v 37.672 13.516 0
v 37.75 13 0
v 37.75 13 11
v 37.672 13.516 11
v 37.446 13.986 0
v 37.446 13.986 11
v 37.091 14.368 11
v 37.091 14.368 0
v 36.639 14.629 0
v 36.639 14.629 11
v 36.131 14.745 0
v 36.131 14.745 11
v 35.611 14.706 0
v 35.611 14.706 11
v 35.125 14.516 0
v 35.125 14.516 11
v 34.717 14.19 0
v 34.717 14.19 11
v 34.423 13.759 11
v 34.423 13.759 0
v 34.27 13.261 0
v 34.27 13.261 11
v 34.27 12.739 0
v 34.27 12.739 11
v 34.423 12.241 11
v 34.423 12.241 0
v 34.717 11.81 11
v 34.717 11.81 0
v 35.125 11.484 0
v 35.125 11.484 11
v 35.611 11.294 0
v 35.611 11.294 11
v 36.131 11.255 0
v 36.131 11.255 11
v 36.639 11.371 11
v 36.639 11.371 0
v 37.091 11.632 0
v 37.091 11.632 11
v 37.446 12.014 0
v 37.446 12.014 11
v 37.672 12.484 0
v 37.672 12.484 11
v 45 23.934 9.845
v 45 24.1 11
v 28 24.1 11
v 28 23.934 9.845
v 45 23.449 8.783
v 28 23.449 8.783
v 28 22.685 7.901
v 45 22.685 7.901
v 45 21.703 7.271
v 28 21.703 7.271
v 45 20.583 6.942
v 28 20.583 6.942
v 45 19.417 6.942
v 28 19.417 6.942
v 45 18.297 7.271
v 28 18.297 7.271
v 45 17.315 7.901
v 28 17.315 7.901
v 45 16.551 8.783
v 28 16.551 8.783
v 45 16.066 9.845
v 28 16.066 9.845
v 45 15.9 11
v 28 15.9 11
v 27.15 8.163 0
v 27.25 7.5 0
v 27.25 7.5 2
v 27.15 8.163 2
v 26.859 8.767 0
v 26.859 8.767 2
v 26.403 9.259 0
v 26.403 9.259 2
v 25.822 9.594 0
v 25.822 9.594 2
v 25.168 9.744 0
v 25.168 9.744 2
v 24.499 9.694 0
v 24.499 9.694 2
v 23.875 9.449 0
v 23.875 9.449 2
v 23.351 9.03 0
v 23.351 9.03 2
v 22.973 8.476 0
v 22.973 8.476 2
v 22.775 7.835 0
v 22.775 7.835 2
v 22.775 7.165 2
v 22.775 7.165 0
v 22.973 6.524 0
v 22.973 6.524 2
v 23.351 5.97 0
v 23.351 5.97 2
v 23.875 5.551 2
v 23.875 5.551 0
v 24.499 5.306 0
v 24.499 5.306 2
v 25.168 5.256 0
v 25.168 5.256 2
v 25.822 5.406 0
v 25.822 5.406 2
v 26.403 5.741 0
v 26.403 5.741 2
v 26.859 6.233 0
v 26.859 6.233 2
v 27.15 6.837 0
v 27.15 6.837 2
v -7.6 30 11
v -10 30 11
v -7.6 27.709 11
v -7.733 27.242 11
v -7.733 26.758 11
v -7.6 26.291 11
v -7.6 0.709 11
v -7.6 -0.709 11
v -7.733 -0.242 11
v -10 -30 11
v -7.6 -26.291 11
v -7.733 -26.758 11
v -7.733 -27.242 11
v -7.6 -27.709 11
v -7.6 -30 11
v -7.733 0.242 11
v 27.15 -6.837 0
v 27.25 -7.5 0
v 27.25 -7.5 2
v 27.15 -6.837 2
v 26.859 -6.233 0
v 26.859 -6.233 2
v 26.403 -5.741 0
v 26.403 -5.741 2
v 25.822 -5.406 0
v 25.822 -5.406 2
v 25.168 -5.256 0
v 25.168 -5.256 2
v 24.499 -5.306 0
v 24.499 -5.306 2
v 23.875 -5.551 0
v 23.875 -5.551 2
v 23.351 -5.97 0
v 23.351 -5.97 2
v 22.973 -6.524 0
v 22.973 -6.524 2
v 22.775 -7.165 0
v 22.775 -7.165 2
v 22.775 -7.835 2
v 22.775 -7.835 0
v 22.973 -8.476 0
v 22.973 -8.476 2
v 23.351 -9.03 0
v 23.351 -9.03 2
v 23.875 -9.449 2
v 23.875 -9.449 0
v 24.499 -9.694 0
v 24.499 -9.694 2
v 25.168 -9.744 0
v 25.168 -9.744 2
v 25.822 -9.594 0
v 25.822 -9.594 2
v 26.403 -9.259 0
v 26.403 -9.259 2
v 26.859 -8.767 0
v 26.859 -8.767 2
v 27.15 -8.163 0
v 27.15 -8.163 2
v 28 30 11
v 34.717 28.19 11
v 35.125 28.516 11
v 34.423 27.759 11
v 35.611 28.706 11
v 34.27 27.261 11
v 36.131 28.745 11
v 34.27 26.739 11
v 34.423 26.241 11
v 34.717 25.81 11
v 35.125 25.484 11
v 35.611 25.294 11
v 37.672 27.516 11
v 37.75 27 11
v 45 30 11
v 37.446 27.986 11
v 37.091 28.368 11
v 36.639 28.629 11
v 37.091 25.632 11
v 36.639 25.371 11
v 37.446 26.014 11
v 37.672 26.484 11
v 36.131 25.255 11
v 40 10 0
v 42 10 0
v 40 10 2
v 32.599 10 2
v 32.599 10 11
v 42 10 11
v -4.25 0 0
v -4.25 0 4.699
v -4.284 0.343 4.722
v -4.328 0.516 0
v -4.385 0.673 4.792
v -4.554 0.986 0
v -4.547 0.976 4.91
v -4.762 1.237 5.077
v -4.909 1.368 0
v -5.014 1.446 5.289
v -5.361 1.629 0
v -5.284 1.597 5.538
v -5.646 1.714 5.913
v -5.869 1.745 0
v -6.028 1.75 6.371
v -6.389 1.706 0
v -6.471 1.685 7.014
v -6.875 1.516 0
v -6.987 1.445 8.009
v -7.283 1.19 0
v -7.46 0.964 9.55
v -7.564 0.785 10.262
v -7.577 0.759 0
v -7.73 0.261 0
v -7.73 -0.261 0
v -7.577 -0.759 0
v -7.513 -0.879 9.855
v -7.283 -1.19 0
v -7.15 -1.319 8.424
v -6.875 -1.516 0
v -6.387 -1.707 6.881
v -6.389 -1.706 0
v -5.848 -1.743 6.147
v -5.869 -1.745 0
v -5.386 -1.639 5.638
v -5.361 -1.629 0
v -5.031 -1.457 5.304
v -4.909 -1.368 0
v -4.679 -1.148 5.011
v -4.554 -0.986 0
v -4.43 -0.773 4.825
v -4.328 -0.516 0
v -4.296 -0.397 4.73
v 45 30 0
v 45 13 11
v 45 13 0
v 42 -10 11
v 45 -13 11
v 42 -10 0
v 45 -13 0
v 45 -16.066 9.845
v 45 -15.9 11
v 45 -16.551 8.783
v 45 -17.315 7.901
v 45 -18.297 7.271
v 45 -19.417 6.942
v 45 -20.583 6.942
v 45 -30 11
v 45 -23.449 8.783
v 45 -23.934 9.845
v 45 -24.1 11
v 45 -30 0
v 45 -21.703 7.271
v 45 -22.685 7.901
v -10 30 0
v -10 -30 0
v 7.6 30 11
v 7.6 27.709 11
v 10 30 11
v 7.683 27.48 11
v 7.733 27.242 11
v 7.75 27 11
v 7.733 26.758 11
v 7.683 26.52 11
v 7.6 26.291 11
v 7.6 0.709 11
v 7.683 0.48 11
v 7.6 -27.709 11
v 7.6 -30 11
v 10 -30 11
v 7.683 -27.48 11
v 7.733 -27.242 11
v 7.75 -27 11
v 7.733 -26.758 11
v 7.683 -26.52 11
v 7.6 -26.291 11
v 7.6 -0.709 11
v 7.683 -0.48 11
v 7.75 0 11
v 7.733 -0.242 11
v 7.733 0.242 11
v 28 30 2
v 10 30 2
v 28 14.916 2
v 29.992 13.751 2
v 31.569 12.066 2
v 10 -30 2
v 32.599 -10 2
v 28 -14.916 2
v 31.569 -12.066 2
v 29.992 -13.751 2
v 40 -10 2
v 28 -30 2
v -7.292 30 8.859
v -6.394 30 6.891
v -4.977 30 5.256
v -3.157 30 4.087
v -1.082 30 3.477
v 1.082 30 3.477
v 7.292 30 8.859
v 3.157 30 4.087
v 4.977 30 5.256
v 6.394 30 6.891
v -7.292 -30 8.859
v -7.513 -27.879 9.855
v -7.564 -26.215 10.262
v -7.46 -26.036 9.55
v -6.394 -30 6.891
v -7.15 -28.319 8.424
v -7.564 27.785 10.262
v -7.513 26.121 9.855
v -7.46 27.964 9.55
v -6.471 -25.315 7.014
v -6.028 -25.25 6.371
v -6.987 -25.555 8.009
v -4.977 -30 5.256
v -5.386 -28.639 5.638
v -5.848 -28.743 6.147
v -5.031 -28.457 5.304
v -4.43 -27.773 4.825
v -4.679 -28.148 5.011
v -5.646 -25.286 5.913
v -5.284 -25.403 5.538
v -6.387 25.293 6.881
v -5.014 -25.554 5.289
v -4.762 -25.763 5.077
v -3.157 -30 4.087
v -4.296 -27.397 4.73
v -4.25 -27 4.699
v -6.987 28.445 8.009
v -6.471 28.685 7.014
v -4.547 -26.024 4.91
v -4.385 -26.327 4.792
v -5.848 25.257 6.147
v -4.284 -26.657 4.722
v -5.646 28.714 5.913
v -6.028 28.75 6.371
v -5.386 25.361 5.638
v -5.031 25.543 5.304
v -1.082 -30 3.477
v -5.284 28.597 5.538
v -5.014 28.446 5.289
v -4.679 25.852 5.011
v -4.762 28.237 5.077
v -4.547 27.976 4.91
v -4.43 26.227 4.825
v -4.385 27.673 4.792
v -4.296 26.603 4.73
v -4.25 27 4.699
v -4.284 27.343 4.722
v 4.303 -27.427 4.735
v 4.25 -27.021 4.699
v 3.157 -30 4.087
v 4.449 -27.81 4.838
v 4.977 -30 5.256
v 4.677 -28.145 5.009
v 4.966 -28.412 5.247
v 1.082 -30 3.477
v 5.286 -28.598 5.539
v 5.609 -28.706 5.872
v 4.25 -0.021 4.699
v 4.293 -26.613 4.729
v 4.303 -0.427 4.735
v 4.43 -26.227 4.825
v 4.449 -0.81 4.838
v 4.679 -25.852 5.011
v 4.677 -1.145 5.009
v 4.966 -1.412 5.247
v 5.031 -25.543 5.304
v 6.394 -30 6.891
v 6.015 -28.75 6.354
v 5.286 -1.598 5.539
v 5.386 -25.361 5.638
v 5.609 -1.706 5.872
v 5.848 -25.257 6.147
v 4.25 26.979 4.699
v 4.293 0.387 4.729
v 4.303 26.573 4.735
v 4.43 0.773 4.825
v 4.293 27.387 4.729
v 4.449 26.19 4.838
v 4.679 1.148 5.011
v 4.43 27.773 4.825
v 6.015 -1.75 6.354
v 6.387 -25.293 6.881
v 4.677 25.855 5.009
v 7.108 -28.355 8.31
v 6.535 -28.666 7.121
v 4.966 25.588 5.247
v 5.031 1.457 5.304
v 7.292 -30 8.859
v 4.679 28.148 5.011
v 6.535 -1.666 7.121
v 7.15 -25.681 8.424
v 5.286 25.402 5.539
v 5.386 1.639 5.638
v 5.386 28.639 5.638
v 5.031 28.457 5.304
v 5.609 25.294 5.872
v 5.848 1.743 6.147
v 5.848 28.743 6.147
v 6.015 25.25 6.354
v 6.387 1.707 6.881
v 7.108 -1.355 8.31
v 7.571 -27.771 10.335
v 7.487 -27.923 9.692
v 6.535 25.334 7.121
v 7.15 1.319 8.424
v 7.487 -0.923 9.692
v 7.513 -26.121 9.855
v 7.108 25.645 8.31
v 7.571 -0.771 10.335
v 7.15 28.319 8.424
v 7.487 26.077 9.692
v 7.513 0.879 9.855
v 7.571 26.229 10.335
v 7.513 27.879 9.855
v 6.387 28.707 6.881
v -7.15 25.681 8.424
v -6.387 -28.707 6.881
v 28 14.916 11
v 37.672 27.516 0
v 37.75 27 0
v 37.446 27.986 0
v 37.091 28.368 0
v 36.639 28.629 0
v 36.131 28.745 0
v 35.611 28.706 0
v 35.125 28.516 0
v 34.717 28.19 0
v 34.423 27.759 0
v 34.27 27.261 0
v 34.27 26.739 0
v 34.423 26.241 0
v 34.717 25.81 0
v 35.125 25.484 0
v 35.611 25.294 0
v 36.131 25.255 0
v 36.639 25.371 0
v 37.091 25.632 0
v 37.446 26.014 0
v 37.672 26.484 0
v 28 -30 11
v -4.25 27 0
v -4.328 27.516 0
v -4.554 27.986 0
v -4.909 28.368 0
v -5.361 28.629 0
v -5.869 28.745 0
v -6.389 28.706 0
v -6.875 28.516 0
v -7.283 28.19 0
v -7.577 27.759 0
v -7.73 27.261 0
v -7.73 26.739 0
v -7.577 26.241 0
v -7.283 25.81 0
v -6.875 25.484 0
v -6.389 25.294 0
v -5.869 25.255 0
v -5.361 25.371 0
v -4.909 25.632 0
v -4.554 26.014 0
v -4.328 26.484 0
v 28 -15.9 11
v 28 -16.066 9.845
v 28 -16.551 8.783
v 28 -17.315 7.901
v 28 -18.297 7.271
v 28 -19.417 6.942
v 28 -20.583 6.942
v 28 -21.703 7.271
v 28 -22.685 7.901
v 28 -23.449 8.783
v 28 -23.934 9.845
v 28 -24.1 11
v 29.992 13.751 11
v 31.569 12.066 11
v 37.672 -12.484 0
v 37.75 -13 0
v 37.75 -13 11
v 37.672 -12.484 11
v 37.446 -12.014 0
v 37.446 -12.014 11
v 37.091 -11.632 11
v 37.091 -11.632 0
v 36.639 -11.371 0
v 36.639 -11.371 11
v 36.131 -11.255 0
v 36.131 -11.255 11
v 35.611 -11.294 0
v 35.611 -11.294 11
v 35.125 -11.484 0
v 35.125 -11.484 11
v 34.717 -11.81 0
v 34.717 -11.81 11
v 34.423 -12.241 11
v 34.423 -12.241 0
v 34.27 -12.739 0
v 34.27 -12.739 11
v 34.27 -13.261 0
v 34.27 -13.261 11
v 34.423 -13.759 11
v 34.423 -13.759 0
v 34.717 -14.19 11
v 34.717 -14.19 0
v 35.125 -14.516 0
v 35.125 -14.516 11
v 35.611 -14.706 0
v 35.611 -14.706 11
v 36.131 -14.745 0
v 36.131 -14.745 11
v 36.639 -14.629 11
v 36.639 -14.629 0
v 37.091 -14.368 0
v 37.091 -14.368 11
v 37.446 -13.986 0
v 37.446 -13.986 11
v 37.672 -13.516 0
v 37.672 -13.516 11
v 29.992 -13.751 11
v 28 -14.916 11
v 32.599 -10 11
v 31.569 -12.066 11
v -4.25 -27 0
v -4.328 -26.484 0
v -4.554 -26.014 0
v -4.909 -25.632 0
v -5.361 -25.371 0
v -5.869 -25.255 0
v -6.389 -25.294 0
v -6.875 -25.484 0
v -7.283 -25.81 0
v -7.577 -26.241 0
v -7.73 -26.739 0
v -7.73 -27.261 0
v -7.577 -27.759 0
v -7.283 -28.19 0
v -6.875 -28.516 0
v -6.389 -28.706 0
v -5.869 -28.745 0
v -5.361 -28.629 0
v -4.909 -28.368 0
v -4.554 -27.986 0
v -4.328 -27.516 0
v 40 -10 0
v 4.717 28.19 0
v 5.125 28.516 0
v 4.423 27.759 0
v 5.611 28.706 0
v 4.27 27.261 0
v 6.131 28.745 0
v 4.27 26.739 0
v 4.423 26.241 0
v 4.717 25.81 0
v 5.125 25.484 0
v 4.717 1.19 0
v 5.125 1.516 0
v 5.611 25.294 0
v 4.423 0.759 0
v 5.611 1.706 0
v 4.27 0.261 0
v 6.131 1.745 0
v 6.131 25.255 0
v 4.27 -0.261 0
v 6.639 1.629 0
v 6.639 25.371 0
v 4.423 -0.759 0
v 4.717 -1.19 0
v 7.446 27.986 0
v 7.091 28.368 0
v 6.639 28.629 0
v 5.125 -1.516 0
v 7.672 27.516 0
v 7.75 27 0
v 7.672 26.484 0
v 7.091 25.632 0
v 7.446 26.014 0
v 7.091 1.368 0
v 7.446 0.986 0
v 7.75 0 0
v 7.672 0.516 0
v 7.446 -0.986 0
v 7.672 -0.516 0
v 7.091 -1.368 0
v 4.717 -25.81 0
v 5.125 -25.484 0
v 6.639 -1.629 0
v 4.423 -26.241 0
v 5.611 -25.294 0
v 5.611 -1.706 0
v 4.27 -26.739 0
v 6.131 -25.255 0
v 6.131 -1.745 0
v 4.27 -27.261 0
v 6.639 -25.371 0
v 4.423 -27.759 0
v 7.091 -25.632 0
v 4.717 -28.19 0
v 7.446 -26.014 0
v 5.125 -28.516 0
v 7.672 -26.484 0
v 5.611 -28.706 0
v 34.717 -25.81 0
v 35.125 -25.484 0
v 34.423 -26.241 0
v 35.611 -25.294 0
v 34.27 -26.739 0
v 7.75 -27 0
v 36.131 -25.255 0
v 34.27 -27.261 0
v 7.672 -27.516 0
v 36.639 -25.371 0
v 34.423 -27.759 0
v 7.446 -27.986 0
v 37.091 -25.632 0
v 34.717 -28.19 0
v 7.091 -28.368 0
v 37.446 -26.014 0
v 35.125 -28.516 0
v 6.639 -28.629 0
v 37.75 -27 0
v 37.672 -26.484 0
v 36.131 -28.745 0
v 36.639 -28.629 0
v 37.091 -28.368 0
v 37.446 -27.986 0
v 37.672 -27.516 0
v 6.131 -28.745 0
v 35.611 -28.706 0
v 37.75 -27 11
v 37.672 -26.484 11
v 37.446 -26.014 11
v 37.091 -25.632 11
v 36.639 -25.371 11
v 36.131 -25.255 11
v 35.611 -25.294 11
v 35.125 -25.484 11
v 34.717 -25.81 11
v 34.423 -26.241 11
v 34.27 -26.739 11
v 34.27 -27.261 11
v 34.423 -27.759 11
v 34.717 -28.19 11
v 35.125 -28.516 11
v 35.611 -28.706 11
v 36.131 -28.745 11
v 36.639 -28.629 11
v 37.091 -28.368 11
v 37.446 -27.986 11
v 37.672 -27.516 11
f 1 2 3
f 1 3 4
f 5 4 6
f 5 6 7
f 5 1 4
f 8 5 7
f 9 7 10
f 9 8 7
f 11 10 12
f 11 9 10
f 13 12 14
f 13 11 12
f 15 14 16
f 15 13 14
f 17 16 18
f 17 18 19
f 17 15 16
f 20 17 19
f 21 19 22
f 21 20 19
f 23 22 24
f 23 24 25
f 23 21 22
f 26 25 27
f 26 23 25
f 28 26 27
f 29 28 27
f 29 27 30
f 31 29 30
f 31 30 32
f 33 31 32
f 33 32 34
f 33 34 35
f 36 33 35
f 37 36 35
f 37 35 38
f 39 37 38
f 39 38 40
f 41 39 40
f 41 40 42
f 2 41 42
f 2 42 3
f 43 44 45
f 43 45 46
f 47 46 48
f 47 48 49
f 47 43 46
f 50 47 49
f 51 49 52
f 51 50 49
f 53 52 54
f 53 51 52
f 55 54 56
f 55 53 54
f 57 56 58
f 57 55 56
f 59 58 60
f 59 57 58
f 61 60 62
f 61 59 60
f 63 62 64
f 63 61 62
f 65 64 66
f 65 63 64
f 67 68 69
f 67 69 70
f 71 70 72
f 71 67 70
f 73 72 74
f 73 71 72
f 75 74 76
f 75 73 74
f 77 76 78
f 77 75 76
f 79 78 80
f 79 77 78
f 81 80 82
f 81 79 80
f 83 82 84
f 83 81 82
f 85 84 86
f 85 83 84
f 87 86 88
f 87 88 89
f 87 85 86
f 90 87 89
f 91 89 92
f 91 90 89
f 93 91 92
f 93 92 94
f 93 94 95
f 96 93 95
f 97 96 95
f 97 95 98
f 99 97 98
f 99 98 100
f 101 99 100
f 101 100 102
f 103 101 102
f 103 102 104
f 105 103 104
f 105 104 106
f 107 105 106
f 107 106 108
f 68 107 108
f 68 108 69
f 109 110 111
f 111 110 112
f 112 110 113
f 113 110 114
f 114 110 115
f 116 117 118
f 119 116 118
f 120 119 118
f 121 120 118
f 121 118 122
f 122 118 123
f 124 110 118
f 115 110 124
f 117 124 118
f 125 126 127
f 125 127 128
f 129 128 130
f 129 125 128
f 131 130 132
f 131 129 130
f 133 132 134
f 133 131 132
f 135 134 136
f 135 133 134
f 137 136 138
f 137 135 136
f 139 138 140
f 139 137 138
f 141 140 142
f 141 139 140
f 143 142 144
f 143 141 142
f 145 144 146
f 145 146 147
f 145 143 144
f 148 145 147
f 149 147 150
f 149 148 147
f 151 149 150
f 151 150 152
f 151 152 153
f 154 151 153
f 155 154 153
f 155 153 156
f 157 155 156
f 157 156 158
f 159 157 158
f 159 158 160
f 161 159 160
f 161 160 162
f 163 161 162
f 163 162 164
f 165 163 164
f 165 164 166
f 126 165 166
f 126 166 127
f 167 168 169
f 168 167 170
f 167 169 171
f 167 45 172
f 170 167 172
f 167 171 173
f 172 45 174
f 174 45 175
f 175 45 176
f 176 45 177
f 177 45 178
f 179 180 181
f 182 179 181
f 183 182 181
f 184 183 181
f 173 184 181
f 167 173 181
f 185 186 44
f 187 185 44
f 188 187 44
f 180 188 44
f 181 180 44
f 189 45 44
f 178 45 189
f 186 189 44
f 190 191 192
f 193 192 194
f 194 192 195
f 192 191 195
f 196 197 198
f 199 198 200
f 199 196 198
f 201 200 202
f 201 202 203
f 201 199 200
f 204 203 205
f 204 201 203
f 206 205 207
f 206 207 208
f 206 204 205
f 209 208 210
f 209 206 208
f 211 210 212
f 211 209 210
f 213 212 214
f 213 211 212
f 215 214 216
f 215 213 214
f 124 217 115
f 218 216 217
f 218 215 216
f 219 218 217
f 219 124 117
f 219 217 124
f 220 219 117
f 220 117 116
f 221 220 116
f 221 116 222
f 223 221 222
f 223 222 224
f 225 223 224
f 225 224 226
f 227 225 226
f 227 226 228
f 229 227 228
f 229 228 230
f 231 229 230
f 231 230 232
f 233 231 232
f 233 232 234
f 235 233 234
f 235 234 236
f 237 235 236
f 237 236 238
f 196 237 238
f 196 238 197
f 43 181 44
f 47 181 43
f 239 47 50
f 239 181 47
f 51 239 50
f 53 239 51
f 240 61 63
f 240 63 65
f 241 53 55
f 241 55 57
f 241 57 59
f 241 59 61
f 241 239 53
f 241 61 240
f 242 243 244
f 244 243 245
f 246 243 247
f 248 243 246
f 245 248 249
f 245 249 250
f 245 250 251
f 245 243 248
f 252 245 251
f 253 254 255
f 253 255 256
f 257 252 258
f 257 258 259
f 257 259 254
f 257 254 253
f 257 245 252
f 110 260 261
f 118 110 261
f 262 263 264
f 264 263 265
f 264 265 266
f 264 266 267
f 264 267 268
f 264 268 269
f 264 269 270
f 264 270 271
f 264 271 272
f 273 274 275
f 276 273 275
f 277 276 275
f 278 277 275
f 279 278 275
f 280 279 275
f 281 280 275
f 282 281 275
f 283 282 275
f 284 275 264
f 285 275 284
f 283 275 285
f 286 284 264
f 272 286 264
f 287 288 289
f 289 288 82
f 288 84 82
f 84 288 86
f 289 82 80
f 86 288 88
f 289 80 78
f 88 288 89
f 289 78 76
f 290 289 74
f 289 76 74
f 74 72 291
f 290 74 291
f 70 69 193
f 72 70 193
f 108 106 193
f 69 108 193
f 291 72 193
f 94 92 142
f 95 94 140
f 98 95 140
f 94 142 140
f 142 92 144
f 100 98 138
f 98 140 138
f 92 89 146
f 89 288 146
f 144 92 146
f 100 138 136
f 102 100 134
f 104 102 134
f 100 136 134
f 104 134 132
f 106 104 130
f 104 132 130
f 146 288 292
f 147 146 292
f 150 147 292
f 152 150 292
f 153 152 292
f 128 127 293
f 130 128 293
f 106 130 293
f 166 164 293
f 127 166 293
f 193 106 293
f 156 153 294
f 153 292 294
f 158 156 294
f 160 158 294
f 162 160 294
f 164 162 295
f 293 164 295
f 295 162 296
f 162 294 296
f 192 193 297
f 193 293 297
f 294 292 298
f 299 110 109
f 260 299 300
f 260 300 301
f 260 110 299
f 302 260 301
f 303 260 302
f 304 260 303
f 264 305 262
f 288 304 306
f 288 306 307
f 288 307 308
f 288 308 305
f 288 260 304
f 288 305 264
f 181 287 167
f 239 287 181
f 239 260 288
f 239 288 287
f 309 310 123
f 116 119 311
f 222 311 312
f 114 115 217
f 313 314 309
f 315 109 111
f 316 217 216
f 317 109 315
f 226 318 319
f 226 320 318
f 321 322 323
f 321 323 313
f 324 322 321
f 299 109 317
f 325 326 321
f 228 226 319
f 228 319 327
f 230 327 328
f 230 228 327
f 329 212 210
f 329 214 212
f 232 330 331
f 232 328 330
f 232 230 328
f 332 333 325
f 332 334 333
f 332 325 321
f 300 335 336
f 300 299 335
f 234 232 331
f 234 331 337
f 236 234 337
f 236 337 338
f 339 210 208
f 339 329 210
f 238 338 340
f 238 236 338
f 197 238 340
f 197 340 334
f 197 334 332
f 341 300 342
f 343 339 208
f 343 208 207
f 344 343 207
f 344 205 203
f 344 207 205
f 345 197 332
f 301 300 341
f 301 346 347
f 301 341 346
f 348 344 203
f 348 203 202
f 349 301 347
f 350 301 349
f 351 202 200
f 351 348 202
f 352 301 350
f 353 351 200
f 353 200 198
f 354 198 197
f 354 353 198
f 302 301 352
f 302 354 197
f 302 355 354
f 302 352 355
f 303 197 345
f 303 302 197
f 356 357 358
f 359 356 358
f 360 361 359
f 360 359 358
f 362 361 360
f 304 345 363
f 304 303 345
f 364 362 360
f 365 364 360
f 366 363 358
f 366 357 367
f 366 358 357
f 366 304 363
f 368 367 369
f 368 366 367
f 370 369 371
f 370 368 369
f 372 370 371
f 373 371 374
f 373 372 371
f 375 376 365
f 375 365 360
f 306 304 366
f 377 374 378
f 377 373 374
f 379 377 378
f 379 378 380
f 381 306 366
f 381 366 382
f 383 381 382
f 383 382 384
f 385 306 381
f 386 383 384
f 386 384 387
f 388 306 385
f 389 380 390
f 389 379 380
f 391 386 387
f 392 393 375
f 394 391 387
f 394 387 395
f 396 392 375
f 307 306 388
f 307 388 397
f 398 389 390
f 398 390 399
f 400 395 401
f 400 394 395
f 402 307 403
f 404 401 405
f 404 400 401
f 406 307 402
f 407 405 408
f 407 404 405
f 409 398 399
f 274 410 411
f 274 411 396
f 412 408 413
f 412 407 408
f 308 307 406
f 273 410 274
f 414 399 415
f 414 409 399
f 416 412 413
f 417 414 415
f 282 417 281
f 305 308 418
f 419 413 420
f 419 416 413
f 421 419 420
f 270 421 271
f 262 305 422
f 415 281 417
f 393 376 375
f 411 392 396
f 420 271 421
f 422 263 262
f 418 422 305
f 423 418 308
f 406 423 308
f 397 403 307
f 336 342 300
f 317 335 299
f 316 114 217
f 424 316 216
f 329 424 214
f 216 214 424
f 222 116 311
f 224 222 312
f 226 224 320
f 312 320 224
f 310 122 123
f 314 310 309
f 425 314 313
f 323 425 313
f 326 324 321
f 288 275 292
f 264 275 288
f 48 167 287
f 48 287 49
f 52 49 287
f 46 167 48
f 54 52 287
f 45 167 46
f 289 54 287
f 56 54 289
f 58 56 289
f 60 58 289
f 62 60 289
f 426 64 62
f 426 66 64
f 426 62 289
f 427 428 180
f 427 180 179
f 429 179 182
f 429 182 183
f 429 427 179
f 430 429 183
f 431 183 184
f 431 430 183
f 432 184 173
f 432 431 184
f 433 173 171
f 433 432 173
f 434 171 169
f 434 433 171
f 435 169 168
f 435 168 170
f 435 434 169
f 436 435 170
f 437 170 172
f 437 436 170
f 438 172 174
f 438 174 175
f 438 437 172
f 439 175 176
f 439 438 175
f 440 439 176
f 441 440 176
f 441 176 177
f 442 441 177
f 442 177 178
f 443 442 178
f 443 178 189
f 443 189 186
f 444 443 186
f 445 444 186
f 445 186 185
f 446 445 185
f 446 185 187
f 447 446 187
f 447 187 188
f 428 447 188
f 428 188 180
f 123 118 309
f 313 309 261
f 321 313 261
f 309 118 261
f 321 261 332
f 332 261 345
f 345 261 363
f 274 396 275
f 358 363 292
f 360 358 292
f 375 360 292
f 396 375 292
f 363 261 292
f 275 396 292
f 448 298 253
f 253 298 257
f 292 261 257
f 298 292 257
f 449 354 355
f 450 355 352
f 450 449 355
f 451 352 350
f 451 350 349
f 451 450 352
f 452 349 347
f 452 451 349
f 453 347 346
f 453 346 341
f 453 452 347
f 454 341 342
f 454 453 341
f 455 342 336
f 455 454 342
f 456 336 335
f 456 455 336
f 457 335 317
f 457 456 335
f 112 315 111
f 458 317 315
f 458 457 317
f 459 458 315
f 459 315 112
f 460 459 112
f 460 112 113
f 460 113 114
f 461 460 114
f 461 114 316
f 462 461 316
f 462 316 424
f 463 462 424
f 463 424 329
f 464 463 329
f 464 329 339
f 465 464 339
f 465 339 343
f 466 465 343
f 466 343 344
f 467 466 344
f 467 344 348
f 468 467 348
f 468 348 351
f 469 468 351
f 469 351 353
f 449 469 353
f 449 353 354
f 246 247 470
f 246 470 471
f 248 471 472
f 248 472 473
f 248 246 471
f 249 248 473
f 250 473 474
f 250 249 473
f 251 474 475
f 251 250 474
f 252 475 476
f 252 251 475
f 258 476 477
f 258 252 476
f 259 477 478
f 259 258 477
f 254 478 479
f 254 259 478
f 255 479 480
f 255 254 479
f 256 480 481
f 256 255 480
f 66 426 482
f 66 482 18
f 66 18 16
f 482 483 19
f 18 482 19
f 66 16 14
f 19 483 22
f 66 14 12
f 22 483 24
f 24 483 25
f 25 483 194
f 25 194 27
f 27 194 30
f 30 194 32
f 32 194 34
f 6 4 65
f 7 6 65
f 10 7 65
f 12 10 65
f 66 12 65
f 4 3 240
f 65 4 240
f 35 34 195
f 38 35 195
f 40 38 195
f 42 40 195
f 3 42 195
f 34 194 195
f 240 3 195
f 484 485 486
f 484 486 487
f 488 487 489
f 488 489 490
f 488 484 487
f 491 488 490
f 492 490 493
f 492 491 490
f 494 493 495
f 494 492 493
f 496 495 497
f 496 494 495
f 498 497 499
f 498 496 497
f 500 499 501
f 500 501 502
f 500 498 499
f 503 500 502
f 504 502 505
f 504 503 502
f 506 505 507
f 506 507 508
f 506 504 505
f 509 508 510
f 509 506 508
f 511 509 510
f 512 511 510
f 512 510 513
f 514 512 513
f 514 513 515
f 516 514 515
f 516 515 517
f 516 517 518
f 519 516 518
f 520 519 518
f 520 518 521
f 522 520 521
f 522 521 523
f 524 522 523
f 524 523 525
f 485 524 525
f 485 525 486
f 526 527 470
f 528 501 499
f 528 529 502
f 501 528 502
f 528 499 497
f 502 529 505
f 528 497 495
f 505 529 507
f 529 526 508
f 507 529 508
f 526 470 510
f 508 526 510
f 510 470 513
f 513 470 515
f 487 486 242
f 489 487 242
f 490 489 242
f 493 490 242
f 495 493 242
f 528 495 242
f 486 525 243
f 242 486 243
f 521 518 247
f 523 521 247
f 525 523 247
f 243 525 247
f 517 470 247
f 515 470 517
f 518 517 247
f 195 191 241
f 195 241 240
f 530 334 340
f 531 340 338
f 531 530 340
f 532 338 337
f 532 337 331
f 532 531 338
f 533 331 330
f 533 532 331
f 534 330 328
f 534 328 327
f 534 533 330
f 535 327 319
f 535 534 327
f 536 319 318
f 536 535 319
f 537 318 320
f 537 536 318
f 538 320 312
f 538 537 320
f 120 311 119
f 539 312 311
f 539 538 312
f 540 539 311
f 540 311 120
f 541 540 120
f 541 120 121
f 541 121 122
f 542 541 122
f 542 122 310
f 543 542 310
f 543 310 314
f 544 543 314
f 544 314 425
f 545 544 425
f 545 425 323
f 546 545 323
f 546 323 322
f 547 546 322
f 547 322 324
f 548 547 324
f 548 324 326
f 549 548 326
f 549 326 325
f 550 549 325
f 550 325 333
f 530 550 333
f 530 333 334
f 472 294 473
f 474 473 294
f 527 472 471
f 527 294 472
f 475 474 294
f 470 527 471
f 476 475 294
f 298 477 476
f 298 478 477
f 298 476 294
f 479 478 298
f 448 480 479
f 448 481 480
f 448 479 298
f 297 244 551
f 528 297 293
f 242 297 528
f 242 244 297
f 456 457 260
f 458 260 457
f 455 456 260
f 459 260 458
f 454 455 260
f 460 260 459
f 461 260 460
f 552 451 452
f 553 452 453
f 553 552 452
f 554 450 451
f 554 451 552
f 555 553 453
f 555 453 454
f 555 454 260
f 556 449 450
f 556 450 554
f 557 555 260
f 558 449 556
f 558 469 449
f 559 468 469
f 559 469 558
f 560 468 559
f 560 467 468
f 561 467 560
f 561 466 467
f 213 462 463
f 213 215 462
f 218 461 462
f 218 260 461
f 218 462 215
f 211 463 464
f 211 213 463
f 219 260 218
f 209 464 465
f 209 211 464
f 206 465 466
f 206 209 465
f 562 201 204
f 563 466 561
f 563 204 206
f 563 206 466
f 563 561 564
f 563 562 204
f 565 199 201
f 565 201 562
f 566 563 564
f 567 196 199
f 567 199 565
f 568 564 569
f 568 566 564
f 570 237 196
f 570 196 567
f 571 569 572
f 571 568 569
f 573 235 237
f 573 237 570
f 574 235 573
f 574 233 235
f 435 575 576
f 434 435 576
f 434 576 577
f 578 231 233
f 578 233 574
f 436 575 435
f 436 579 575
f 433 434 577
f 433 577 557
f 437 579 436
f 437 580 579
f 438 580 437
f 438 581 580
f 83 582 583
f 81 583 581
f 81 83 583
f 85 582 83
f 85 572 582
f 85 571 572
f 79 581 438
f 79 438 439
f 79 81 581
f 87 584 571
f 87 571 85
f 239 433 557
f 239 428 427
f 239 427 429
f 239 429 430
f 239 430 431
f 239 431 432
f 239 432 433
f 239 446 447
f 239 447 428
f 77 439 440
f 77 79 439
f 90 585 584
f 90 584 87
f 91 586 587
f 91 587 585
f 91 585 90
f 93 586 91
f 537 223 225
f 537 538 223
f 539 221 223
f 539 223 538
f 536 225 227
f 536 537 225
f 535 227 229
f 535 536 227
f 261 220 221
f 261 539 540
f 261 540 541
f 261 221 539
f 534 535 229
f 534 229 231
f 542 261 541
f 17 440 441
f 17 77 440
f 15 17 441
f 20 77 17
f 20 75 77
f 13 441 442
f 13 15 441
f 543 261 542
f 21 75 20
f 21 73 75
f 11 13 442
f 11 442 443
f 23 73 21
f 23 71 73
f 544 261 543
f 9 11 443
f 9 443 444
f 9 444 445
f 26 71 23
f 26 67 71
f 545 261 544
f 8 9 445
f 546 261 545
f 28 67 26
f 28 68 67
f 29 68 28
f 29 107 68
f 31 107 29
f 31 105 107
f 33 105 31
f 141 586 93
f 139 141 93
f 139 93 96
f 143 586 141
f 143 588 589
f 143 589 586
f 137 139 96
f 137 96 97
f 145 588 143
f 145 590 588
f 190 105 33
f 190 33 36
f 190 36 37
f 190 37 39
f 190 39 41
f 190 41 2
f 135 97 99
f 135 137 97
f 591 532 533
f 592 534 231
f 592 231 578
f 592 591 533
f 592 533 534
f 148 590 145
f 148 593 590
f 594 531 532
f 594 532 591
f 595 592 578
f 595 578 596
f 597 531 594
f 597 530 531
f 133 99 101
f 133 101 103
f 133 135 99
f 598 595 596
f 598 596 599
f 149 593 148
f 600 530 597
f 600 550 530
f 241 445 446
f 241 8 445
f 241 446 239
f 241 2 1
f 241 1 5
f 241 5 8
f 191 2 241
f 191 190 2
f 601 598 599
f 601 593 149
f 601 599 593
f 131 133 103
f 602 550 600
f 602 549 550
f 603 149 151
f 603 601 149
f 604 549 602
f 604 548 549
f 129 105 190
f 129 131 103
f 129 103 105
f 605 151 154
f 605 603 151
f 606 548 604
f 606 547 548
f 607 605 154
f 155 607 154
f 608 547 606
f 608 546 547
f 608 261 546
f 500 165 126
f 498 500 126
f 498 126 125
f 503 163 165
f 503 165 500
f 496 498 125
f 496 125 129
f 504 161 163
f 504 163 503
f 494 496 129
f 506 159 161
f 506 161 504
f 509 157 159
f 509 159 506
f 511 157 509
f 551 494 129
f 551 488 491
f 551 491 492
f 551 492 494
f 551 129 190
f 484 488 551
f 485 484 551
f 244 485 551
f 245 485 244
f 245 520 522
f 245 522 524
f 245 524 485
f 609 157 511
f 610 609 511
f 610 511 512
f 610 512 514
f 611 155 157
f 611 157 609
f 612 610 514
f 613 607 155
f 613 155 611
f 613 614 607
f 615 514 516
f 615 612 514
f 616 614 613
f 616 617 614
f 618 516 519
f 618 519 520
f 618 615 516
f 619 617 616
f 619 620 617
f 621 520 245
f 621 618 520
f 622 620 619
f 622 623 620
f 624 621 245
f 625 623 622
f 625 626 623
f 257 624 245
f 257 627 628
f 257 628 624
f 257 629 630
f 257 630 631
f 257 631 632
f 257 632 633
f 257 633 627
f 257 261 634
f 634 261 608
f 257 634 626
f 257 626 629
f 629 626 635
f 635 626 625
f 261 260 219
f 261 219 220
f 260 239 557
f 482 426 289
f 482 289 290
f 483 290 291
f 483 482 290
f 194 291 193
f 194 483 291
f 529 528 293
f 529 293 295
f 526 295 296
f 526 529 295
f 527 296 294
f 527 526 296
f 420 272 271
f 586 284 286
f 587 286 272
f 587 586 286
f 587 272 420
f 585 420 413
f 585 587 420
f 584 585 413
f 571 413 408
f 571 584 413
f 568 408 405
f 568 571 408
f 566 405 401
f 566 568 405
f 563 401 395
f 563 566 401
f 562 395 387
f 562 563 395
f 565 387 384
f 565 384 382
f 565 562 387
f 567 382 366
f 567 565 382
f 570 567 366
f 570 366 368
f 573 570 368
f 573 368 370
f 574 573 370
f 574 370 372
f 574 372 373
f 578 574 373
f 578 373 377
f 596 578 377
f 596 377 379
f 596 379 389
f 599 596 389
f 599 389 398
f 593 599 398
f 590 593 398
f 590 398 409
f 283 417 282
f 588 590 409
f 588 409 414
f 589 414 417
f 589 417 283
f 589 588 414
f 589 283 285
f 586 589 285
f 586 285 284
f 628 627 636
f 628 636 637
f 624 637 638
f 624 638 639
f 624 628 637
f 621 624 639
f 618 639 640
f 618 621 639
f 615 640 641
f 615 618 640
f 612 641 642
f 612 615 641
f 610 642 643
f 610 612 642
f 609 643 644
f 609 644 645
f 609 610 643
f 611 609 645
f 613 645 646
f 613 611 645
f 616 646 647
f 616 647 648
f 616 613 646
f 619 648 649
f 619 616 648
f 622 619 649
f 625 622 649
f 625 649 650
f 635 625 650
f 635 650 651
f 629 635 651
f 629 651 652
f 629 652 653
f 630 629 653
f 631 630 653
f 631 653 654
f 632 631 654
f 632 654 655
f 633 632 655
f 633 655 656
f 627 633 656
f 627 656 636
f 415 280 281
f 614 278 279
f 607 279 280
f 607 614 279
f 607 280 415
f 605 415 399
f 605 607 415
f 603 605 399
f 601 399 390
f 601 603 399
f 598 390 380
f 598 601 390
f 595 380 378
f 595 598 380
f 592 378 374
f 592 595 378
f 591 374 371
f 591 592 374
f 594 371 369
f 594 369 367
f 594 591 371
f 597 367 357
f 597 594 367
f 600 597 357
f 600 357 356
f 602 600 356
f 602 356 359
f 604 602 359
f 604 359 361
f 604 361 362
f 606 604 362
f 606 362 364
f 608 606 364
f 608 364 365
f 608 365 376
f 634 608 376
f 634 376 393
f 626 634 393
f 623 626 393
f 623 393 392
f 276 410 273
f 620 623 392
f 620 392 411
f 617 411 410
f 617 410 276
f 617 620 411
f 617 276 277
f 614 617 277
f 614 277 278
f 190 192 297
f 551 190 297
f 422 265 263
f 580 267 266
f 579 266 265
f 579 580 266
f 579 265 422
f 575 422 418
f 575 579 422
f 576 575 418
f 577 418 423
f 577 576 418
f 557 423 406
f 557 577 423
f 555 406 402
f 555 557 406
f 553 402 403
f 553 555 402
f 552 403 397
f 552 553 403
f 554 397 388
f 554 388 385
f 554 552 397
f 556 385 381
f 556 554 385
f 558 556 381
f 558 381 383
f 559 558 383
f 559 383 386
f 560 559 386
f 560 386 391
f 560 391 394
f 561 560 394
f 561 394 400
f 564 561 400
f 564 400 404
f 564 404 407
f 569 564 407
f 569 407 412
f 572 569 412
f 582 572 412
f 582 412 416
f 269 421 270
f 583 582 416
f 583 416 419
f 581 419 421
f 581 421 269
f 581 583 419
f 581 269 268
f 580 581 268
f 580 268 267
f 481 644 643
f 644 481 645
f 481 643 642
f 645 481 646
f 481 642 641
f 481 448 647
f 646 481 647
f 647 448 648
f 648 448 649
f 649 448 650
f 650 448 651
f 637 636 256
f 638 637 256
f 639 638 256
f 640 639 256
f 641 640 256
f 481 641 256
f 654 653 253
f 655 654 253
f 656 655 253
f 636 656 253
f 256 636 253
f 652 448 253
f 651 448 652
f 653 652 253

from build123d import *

# Parameters (mm, degrees)
SKETCH_W                       = 55
SKETCH_H                       = 60
PAD_DEPTH                      = 11
SKETCH001_R                    = 7.6
POCKET_DEPTH                   = 60.001
SKETCH002_R                    = 1.75
POCKET001_DEPTH                = 11.001
POCKET002_DEPTH                = 9
SKETCH004_R                    = 2.25
POCKET003_DEPTH                = 11.001
SKETCH008_R                    = 4.1
POCKET005_DEPTH                = 20
SKETCH010_W                    = 20
SKETCH010_H                    = 25
POCKET006_DEPTH                = 5
CHAMFER_SIZE                   = 3
CHAMFER001_SIZE                = 3
PART_MIRRORING_PLACEMENT_ANGLE = 180


with BuildPart() as chamfer002:
    # Sketch → Pad (new body)
    with BuildSketch(Plane.XY):
        with Locations((17.5, 0)):
            Rectangle(SKETCH_W, SKETCH_H)
    extrude(amount=PAD_DEPTH)

    # Sketch001 → Pocket (cut, through all)
    with BuildSketch(Plane.XZ.offset(30)):
        with Locations((0, 11)):
            Circle(SKETCH001_R)
    extrude(amount=-POCKET_DEPTH, mode=Mode.SUBTRACT)

    # Sketch002 → Pocket001 (cut, through all)
    with BuildSketch(Plane(origin=(0, 0, 0), x_dir=(1, 0, 0), z_dir=(0, 0, -1))):
        with Locations((-6, 27)):
            Circle(SKETCH002_R)
        with Locations((36, 27)):
            Circle(SKETCH002_R)
        with Locations((-6, -27)):
            Circle(SKETCH002_R)
        with Locations((36, -27)):
            Circle(SKETCH002_R)
        with Locations((6, 27)):
            Circle(SKETCH002_R)
        with Locations((6, -27)):
            Circle(SKETCH002_R)
        with Locations((6, 0)):
            Circle(SKETCH002_R)
        with Locations((-6, 0)):
            Circle(SKETCH002_R)
        with Locations((36, -13)):
            Circle(SKETCH002_R)
        with Locations((36, 13)):
            Circle(SKETCH002_R)
    extrude(amount=-POCKET001_DEPTH, mode=Mode.SUBTRACT)

    # Sketch003 → Pocket002 (cut)
    with BuildSketch(Plane.XY.offset(11)):
        with BuildLine():
            Line((10, 35), (10, -35))
            Line((10, -35), (28, -35))
            Line((28, -35), (28, -14.916198))
            ThreePointArc((28, -14.916198), (30.841983, -12.965458), (32.599342, -10))
            Line((32.599342, -10), (52.599342, -10))
            Line((52.599342, -10), (52.599342, 10))
            Line((52.599342, 10), (32.599342, 10))
            ThreePointArc((32.599342, 10), (30.841983, 12.965458), (28, 14.916198))
            Line((28, 14.916198), (28, 35))
            Line((28, 35), (10, 35))
        make_face()
    extrude(amount=-POCKET002_DEPTH, mode=Mode.SUBTRACT)

    # Sketch004 → Pocket003 (cut, through all)
    with BuildSketch(Plane(origin=(0, 0, 0), x_dir=(1, 0, 0), z_dir=(0, 0, -1))):
        with Locations((25, 7.5)):
            Circle(SKETCH004_R)
        with Locations((25, -7.5)):
            Circle(SKETCH004_R)
    extrude(amount=-POCKET003_DEPTH, mode=Mode.SUBTRACT)

    # Sketch008 → Pocket005 (cut)
    with BuildSketch(Plane.YZ.offset(45)):
        with Locations((-20, 11)):
            Circle(SKETCH008_R)
        with Locations((20, 11)):
            Circle(SKETCH008_R)
    extrude(amount=-POCKET005_DEPTH, mode=Mode.SUBTRACT)

    # Sketch010 → Pocket006 (cut)
    with BuildSketch(Plane.YZ.offset(45)):
        with Locations((0, 3.5)):
            Rectangle(SKETCH010_W, SKETCH010_H)
    extrude(amount=-POCKET006_DEPTH, mode=Mode.SUBTRACT)

    # Chamfer
    chamfer_edges = [chamfer002.edges().sort_by_distance(p)[0] for p in [
        (45, -10, 6.5),
    ]]
    chamfer(chamfer_edges, length=CHAMFER_SIZE)

    # Chamfer001
    chamfer001_edges = [chamfer002.edges().sort_by_distance(p)[0] for p in [
        (45, 10, 6.5),
    ]]
    chamfer(chamfer001_edges, length=CHAMFER001_SIZE)


with BuildPart() as xy_block_top:
    # Part__Mirroring: instance of Chamfer002
    add(chamfer002.part.mirror(Plane(origin=(0, 0, 0), x_dir=(0, 1, 0), z_dir=(0, 0, 1))))


with BuildPart() as xy_block_top_1:
    # Part__Mirroring placement: moved
    add(xy_block_top.part.rotate(Axis((0, 0, 0), (1, 0, 0)), PART_MIRRORING_PLACEMENT_ANGLE))


solid = xy_block_top_1.part
